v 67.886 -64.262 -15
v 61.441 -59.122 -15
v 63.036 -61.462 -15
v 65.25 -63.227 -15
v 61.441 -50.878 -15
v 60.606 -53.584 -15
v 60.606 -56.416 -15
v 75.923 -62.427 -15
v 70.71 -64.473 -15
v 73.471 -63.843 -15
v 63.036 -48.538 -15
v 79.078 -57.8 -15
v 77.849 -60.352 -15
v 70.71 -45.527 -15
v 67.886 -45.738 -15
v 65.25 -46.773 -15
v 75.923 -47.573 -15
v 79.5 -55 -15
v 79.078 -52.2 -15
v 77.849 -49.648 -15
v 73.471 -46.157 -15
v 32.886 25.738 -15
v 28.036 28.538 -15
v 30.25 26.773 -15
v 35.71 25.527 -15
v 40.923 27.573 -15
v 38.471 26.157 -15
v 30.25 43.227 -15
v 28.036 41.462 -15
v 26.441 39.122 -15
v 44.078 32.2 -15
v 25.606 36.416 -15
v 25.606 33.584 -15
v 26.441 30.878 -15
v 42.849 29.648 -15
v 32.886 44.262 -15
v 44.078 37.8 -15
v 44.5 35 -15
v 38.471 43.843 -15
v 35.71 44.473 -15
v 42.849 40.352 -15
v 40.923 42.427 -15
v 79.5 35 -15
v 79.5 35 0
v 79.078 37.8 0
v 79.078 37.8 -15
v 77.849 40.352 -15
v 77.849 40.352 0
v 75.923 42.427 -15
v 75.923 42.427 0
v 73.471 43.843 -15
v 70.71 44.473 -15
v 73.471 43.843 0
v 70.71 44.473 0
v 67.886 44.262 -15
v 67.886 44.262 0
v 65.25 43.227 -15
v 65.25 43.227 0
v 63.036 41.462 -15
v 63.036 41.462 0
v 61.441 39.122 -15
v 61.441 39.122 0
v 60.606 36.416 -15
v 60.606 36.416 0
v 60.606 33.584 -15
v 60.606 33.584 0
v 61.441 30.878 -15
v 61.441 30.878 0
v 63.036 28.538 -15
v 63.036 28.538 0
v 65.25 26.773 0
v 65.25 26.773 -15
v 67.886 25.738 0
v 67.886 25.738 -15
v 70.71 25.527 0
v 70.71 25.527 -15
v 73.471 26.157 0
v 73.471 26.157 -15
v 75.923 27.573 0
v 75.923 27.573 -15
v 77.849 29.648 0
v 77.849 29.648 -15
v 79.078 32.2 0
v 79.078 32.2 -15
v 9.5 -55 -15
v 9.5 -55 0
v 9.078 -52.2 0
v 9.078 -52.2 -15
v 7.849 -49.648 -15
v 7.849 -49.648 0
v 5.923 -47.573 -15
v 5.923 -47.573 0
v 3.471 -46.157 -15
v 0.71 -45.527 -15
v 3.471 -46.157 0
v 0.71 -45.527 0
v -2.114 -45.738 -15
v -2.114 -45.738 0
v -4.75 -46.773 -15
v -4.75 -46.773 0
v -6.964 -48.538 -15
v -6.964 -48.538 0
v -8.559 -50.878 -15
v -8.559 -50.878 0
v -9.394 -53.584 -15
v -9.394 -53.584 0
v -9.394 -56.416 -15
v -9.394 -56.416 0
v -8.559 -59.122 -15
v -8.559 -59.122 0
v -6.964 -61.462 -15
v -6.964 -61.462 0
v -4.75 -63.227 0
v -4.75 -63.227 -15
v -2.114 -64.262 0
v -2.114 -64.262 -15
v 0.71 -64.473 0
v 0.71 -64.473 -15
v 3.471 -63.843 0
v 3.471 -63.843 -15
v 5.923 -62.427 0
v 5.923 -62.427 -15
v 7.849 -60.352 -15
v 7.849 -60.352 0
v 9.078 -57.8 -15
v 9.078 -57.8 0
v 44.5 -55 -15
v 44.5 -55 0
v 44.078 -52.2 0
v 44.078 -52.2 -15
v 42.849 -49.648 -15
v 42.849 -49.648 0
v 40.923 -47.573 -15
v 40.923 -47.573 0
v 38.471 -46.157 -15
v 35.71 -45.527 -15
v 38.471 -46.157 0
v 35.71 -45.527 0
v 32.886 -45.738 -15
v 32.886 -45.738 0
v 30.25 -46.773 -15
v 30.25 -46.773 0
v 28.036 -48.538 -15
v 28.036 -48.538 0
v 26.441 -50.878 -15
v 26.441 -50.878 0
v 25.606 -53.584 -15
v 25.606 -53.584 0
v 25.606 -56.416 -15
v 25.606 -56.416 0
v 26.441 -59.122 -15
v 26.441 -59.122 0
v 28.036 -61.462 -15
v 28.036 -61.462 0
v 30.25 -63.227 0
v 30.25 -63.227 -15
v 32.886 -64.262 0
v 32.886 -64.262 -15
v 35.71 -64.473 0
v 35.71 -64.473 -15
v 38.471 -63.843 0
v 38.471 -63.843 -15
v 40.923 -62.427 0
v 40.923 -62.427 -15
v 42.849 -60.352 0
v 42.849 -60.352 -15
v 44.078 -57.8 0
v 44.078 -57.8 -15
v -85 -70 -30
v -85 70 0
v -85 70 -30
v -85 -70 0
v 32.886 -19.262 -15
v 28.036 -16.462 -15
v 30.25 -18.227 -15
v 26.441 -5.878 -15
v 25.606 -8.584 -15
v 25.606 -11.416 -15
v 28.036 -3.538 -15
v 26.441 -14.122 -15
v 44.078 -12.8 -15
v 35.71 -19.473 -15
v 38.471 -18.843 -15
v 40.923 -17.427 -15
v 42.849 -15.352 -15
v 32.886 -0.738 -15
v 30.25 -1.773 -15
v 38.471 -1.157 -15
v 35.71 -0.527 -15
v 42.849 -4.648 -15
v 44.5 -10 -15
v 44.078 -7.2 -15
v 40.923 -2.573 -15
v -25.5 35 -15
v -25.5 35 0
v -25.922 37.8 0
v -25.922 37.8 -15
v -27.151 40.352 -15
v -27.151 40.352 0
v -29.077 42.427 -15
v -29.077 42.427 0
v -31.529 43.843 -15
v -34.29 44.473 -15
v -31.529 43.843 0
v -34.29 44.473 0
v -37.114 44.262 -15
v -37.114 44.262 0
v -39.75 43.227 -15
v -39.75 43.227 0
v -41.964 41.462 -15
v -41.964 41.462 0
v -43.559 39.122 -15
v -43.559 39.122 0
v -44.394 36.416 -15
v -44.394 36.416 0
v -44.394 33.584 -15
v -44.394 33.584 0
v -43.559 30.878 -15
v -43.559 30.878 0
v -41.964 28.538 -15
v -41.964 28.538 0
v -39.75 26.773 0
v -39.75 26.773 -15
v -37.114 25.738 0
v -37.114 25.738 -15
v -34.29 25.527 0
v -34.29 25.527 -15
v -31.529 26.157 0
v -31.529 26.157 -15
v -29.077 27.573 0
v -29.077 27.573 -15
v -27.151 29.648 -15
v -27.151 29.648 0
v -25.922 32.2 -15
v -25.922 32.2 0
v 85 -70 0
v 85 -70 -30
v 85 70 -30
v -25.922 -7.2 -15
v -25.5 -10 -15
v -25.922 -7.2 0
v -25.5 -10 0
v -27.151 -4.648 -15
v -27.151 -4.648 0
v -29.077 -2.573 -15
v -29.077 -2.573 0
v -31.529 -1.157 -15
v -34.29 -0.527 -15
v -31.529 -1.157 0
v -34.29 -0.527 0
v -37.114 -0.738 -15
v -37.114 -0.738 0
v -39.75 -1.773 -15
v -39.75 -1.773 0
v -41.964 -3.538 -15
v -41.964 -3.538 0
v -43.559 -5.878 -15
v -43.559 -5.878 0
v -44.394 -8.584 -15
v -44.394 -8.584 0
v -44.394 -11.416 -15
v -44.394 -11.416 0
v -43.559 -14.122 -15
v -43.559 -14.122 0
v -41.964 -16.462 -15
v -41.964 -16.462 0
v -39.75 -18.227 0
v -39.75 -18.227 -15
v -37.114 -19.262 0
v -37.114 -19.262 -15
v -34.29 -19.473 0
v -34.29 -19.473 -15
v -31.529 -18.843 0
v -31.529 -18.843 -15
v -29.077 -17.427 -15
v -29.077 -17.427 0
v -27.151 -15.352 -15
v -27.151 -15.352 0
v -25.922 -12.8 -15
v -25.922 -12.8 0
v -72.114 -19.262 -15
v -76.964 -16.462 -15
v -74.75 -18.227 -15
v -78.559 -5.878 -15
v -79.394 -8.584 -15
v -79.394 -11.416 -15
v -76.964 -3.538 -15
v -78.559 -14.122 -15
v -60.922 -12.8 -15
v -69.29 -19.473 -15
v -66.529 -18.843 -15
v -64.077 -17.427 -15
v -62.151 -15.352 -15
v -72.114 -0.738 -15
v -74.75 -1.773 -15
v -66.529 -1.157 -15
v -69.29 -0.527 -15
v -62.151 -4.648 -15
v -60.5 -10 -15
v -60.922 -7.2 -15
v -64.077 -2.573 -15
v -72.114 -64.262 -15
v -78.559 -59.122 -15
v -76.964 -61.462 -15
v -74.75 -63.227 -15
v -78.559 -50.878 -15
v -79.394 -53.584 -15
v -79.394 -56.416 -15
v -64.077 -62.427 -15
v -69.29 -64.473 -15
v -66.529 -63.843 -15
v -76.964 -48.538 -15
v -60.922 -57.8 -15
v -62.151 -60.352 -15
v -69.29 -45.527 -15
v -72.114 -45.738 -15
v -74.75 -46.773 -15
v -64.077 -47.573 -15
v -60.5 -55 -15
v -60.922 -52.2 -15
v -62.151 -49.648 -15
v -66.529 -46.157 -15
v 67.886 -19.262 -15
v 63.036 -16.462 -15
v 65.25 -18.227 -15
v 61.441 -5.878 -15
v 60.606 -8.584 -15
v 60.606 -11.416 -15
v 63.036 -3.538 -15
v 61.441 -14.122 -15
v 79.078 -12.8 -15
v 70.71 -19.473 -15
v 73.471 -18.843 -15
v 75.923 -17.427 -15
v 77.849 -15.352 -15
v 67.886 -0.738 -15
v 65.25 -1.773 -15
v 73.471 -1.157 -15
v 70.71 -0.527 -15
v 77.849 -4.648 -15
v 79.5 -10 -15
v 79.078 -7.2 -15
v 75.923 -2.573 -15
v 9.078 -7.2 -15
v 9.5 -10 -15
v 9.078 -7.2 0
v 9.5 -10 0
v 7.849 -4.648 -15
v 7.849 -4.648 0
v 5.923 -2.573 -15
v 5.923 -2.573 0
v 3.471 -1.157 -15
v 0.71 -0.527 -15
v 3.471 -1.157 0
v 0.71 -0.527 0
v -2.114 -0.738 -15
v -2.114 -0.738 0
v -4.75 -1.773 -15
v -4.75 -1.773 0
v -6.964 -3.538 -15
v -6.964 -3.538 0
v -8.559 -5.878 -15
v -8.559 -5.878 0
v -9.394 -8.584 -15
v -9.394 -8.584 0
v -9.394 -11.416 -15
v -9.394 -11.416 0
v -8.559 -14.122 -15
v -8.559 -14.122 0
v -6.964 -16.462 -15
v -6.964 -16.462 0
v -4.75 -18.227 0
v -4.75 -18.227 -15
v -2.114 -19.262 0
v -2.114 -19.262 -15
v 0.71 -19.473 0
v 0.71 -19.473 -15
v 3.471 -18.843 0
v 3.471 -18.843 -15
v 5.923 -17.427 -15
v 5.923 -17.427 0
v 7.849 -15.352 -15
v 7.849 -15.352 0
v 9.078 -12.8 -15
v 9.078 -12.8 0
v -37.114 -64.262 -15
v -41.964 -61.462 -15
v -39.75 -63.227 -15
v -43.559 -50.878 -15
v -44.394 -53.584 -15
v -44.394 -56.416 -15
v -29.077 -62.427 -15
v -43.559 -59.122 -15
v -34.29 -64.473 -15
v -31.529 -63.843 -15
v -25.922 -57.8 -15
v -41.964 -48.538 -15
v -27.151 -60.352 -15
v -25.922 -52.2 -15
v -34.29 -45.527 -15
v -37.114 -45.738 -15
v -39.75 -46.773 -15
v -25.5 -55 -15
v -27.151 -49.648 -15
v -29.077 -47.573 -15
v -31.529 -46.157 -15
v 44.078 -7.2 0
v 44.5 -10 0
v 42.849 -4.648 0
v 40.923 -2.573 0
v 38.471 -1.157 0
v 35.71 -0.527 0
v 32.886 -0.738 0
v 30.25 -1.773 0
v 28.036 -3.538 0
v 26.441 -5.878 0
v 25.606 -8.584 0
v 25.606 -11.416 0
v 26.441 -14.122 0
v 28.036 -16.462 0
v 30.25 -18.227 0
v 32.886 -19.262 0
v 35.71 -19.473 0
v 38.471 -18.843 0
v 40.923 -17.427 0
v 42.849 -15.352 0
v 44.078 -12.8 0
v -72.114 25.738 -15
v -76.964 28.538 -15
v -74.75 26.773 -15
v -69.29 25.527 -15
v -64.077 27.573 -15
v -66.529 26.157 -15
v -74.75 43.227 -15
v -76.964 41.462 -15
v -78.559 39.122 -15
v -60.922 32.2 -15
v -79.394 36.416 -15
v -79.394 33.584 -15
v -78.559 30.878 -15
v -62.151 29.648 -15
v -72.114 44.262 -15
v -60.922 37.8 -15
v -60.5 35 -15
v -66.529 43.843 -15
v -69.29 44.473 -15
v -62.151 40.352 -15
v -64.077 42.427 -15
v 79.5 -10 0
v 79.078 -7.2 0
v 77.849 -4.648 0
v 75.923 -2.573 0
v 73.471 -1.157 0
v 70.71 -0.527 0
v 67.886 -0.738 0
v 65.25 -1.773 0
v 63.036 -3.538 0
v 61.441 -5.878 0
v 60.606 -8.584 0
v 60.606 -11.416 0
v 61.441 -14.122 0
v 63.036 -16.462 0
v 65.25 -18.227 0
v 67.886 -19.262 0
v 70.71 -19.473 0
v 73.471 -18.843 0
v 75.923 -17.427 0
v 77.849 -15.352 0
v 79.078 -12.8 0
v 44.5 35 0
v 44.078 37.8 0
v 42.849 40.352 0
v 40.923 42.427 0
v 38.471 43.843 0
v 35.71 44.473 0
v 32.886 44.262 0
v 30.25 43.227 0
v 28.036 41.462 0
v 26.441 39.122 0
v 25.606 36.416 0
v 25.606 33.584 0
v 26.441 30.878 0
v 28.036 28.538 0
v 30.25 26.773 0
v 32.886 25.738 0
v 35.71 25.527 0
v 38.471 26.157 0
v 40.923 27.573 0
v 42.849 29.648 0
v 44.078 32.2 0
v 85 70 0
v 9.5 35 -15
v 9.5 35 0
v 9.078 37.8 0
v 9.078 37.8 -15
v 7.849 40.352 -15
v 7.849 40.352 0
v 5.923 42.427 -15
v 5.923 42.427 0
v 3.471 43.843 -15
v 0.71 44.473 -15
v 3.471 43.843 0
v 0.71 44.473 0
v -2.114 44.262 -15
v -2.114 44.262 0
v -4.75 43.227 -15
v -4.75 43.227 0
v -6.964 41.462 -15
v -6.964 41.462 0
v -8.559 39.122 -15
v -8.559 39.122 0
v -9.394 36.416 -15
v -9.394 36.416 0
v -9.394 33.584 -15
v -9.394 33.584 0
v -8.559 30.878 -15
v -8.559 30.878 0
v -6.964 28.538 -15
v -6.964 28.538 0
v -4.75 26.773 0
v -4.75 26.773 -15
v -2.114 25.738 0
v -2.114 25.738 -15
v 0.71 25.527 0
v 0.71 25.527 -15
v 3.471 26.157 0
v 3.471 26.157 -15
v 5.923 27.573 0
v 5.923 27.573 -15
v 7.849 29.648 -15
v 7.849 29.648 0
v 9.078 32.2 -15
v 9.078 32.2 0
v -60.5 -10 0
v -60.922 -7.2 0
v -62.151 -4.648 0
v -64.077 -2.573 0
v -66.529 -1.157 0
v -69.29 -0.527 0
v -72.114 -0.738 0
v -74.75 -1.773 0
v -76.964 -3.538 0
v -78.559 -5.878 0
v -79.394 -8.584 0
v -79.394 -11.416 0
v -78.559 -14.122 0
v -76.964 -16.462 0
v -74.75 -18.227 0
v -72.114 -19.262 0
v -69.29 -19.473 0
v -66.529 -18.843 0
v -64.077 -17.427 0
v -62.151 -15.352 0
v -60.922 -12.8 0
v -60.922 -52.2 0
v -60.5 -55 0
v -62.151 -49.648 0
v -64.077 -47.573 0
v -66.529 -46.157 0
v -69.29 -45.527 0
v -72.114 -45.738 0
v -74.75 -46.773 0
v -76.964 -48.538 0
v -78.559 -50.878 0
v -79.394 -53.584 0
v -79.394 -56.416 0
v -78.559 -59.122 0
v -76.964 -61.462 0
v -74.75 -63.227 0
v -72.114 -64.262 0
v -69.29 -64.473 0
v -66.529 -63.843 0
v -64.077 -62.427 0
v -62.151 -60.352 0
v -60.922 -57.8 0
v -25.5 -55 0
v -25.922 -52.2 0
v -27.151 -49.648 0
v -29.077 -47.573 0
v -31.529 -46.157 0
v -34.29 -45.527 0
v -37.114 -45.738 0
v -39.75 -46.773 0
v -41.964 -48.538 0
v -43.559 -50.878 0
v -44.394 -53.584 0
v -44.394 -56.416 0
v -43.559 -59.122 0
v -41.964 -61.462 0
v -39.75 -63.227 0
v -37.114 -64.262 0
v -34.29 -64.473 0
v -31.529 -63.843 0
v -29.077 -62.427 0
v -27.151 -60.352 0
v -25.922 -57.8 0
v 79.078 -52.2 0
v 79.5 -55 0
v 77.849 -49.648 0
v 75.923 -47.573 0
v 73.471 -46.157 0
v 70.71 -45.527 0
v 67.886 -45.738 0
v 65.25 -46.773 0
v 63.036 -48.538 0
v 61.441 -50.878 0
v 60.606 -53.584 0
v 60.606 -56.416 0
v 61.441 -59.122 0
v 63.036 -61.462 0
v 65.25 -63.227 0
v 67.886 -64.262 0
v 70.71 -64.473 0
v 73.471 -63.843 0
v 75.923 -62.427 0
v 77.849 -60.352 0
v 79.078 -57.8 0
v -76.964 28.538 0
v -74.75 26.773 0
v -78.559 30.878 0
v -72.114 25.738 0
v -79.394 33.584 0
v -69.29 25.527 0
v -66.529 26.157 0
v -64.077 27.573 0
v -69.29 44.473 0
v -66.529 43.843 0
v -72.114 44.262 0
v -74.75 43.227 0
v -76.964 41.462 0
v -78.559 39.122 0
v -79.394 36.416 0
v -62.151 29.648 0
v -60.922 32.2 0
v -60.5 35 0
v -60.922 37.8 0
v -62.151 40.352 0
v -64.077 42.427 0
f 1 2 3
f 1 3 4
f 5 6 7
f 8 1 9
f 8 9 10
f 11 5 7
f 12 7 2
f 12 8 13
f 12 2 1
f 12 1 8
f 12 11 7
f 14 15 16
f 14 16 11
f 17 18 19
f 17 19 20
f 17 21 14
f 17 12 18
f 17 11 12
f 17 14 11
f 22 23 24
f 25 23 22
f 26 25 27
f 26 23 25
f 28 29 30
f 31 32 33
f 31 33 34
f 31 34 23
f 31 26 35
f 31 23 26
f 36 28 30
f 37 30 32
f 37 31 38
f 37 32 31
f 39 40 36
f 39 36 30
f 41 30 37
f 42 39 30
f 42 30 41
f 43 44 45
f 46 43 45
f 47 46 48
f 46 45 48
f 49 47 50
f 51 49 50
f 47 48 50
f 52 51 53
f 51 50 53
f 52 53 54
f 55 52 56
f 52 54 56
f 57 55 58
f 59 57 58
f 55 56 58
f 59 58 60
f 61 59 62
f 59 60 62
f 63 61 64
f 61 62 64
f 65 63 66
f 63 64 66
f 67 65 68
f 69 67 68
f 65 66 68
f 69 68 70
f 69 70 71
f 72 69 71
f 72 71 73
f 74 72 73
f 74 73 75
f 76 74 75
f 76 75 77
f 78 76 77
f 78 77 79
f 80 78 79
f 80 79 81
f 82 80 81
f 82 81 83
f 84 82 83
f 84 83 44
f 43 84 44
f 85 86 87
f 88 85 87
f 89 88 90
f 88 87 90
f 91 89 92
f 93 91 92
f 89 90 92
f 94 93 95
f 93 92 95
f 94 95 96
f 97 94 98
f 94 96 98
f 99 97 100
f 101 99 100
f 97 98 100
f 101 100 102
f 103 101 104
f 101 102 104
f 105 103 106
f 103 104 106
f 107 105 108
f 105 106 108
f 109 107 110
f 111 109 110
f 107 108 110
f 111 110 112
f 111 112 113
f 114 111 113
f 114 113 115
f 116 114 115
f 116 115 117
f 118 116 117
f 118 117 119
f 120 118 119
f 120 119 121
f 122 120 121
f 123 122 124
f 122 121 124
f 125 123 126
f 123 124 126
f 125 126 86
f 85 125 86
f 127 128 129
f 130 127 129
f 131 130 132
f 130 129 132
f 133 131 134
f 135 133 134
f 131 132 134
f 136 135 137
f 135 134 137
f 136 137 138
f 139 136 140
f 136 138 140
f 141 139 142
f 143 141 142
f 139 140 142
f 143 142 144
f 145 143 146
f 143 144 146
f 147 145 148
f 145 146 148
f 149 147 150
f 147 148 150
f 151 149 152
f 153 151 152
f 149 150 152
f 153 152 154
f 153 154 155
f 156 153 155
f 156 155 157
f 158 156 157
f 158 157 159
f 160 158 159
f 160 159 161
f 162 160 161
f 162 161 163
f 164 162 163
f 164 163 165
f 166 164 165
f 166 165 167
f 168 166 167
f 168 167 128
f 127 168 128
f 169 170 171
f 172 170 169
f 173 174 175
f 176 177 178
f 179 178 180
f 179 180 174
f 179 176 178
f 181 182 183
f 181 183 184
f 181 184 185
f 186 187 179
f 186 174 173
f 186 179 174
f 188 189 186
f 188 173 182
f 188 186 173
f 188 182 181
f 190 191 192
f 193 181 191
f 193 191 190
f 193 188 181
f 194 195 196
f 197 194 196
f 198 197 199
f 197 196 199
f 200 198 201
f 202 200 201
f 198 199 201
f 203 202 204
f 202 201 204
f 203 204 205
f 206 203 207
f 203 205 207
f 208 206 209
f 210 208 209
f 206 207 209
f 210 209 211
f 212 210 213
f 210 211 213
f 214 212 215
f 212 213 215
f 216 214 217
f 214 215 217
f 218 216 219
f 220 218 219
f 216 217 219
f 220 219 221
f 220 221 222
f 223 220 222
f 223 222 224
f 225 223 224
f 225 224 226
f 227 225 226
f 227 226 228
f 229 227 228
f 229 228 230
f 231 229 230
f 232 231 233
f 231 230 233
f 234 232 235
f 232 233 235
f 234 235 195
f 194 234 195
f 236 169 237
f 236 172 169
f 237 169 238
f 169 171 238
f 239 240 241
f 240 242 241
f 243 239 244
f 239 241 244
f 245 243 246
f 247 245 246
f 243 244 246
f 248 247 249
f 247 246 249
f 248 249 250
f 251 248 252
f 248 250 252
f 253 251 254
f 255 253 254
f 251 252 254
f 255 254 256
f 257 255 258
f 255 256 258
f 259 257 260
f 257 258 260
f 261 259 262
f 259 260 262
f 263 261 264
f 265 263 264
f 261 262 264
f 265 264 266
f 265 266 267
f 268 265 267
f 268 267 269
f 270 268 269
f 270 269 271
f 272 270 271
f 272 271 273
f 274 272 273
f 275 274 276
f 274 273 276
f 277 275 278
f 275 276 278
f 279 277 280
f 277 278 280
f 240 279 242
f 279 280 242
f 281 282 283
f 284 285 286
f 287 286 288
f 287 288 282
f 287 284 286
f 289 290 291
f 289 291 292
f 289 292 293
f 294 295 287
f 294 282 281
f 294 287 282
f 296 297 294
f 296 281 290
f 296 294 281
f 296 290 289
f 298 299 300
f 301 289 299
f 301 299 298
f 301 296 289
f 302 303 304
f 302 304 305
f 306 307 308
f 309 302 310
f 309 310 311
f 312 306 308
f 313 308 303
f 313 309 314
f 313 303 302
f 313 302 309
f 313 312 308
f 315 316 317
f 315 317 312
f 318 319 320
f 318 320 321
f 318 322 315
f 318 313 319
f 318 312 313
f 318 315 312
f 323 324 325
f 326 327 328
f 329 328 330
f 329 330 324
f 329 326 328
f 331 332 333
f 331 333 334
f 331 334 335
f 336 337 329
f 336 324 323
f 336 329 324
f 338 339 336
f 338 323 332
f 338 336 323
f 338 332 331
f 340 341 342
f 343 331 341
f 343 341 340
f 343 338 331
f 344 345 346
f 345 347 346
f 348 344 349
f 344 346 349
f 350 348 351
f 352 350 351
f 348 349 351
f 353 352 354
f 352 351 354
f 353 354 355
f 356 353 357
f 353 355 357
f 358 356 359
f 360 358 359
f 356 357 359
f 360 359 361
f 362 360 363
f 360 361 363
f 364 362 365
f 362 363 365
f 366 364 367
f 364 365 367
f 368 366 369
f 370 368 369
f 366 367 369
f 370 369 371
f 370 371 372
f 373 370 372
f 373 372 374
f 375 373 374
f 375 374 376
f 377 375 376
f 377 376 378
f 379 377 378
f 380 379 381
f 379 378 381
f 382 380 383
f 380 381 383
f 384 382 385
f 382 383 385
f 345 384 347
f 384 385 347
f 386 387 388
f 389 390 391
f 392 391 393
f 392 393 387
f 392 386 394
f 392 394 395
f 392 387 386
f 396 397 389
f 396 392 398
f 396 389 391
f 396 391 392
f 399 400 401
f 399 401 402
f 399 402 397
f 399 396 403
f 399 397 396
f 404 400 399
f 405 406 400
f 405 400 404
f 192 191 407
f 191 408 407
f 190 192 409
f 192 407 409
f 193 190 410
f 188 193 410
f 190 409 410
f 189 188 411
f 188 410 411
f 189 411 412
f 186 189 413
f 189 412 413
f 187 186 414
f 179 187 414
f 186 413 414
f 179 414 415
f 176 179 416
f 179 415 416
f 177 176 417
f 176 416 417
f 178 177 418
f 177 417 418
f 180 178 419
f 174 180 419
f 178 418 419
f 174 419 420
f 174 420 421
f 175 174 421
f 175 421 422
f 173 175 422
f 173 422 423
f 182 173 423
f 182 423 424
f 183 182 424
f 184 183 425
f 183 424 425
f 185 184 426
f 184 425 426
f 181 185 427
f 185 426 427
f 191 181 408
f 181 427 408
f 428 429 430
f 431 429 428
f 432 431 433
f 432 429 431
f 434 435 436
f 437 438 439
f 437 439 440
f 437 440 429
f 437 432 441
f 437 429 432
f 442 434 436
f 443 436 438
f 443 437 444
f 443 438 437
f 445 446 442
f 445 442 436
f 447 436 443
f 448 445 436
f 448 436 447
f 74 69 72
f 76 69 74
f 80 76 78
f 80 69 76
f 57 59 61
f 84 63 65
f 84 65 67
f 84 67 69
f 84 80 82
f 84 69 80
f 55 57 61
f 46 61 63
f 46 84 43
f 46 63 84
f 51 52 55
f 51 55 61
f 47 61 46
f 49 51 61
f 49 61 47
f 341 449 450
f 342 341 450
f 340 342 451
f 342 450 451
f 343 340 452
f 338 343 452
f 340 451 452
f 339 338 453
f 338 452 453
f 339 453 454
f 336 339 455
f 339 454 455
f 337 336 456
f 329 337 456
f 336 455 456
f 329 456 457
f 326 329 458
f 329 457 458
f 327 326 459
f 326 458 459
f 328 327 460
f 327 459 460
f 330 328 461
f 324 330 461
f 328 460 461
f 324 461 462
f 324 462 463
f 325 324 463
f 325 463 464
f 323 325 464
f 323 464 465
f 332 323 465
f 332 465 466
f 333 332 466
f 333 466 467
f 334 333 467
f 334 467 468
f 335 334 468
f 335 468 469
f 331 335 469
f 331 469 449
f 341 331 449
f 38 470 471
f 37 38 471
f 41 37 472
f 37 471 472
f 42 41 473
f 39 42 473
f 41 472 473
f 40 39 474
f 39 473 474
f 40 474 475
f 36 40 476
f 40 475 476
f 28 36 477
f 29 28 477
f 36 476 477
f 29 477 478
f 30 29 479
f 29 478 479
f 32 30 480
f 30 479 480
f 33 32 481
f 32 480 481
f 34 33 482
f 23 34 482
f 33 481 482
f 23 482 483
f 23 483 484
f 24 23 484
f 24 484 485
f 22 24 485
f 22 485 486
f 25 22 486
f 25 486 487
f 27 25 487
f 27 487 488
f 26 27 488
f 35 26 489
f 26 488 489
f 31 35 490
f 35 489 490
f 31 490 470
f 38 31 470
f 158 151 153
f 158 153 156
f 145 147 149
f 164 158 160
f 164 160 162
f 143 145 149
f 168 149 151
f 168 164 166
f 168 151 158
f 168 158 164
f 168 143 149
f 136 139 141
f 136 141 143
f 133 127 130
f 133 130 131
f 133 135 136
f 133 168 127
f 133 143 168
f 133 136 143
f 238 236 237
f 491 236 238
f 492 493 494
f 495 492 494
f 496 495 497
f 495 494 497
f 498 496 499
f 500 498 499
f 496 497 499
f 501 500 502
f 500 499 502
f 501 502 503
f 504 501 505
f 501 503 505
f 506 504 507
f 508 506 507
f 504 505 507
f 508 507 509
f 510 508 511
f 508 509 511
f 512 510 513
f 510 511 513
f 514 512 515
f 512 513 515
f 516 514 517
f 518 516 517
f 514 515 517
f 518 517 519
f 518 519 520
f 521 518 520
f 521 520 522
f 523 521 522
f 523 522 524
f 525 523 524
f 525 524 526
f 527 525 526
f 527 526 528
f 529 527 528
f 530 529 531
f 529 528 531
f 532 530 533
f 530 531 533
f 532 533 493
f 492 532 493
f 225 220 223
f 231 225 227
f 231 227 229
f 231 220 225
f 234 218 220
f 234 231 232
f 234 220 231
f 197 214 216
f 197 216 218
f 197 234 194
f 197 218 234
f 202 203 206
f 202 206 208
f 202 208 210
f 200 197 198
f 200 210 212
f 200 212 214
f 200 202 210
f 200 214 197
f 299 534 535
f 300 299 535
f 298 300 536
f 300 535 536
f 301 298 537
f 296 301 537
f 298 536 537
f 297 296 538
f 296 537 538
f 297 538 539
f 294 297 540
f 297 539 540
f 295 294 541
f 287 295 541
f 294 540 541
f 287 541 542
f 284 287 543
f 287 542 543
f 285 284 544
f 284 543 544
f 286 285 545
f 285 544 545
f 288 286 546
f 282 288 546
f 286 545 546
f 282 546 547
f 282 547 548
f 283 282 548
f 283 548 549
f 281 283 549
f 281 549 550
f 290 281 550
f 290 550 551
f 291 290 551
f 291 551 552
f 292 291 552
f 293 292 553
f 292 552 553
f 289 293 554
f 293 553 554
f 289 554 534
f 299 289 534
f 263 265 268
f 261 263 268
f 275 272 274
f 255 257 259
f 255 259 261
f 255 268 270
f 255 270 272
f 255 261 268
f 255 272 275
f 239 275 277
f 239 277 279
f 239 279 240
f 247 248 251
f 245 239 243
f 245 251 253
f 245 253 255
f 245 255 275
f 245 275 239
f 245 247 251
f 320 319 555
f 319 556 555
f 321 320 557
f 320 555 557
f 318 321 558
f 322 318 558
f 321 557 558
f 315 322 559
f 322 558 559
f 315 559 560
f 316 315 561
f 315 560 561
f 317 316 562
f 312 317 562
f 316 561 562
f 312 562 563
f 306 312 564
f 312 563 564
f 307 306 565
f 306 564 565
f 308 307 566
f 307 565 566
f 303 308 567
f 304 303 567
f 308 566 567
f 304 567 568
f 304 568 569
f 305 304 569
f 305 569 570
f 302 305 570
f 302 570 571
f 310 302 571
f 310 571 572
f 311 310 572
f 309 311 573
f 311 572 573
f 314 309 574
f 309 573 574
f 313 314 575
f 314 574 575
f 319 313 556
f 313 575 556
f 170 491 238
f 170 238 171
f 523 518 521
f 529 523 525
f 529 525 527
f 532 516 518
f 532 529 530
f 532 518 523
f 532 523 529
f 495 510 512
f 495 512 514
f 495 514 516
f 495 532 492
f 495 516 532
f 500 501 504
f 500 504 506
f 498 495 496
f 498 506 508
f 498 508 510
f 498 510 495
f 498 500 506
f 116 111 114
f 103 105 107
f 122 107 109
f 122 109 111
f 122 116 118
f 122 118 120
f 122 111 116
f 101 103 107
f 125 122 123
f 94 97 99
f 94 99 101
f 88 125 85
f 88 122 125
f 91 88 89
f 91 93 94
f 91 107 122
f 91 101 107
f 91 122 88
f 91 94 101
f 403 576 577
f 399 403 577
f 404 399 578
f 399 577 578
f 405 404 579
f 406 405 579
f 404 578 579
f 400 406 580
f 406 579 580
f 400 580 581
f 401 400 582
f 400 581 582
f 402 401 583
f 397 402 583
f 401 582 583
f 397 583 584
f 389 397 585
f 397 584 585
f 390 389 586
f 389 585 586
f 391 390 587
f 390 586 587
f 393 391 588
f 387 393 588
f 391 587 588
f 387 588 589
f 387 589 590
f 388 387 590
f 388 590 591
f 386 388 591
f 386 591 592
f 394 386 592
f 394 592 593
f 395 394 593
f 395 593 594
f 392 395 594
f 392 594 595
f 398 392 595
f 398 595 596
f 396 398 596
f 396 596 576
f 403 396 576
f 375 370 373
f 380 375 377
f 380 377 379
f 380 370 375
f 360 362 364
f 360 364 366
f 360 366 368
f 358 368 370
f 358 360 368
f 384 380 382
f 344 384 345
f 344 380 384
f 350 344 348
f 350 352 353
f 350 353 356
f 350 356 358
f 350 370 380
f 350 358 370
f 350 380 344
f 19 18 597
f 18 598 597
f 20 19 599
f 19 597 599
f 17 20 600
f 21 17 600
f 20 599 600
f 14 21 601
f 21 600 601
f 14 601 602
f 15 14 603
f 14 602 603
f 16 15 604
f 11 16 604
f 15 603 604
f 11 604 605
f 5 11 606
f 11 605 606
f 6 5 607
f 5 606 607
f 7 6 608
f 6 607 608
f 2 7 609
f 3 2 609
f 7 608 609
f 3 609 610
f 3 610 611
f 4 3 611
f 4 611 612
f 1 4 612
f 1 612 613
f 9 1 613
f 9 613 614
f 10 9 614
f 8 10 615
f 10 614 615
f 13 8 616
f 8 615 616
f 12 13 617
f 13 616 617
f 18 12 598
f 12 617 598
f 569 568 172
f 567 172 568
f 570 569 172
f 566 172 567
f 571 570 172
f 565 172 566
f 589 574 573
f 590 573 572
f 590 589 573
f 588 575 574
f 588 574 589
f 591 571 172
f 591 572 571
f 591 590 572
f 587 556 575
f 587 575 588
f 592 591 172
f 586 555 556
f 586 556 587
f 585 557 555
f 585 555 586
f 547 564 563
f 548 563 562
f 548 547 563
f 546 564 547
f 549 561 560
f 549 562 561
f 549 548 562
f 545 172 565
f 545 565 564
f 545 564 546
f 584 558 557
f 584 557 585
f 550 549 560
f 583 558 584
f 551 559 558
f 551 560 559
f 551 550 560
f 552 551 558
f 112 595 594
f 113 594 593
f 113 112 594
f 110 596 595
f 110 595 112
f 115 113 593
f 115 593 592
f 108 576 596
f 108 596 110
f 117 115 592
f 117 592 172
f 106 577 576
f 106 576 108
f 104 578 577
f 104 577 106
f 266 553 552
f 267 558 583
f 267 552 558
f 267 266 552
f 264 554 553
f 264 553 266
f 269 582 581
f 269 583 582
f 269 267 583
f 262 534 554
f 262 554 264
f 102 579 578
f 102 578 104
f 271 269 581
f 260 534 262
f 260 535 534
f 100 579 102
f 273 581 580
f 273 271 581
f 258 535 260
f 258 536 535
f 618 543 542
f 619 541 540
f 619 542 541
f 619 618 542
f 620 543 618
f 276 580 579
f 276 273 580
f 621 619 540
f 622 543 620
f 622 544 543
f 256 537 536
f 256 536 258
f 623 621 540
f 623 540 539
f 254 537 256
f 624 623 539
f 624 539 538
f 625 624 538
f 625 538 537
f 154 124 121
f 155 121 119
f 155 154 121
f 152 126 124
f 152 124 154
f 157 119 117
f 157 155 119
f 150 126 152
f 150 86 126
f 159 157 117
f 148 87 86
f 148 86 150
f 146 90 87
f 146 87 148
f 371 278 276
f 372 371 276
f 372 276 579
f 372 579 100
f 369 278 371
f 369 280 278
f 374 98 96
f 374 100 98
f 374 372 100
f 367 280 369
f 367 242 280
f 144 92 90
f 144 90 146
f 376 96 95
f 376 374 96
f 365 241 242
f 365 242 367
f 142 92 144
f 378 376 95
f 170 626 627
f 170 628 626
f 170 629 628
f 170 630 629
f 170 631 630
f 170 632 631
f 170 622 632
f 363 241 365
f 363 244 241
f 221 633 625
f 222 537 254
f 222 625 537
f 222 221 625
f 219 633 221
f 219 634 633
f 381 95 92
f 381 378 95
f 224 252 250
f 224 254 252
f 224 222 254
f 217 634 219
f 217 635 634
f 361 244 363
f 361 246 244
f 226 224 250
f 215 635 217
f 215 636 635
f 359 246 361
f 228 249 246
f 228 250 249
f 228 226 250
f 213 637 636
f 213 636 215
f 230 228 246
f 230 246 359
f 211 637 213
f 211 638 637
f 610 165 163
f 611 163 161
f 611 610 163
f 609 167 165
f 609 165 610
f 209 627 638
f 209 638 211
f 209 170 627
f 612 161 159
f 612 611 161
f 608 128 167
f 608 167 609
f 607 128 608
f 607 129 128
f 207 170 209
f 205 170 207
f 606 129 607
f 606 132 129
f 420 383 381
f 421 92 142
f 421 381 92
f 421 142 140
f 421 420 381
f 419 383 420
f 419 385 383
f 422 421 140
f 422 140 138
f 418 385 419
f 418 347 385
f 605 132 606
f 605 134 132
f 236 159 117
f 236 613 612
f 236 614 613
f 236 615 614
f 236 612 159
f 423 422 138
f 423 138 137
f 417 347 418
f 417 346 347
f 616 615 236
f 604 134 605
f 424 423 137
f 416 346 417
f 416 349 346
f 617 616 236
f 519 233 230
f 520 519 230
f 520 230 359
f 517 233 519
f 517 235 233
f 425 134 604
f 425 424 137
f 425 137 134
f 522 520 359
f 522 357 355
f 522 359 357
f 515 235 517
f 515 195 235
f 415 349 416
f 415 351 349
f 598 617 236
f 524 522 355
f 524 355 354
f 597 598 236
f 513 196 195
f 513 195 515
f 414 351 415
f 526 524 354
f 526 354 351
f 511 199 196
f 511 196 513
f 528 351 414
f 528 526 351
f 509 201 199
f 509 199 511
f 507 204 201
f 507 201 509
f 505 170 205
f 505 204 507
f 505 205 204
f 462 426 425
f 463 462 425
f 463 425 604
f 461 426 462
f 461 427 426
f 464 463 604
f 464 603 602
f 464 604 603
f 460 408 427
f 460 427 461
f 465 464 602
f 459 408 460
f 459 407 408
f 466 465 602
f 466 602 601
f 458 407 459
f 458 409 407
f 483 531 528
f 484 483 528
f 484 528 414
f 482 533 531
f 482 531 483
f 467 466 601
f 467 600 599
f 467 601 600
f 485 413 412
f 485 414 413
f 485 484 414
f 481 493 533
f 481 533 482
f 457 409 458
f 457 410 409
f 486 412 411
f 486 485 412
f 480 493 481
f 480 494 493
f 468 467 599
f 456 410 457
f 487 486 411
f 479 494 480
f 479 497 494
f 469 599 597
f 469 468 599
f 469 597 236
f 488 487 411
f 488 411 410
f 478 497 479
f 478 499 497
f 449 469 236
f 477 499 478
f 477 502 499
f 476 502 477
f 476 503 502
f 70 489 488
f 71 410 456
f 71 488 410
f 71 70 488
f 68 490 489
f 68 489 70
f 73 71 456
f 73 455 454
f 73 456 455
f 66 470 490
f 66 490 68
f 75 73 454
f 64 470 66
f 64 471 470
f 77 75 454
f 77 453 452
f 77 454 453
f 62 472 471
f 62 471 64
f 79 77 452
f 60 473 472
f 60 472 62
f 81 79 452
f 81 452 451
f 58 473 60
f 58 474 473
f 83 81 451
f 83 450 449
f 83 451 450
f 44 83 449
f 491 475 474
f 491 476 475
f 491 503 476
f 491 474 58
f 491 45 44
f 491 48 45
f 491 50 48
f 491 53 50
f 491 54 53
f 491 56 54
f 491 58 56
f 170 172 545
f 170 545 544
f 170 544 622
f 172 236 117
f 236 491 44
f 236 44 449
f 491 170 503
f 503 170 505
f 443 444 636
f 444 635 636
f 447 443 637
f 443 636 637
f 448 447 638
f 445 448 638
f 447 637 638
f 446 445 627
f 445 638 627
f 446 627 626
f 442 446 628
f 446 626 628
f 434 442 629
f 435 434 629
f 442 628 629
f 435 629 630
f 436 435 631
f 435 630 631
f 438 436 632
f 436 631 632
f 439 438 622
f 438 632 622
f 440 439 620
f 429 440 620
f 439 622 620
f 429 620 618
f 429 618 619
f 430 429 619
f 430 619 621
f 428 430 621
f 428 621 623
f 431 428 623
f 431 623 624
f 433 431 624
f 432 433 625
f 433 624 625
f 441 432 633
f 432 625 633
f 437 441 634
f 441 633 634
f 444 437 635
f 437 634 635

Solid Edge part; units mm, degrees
sketch "Sketch1" plane through (0, 0, 0) normal (0, 0, 1) x (1, 0, 0)
  line L0 (-85, -70) -> (85, -70)
  line L1 (85, -70) -> (85, 70)
  line L2 (85, 70) -> (-85, 70)
  line L3 (-85, 70) -> (-85, -70)
extrude "Protrusion1" add sketch "Sketch1" against normal blind 30
sketch "Sketch2" plane through (0, 0, 0) normal (0, 0, 1) x (1, 0, 0)
  circle A0 centre (-70, -55) radius 9.5
  circle A1 centre (-35, -55) radius 9.5
  circle A2 centre (0, -55) radius 9.5
  circle A3 centre (35, -55) radius 9.5
  circle A4 centre (70, -55) radius 9.5
  circle A5 centre (70, -10) radius 9.5
  circle A6 centre (70, 35) radius 9.5
  circle A7 centre (35, -10) radius 9.5
  circle A8 centre (0, -10) radius 9.5
  circle A9 centre (-35, -10) radius 9.5
  circle A10 centre (-70, -10) radius 9.5
  circle A11 centre (35, 35) radius 9.5
  circle A12 centre (0, 35) radius 9.5
  circle A13 centre (-35, 35) radius 9.5
  circle A14 centre (-70, 35) radius 9.5
extrude "Recorte_Extrudado_1" cut sketch "Sketch2" against normal blind 15
